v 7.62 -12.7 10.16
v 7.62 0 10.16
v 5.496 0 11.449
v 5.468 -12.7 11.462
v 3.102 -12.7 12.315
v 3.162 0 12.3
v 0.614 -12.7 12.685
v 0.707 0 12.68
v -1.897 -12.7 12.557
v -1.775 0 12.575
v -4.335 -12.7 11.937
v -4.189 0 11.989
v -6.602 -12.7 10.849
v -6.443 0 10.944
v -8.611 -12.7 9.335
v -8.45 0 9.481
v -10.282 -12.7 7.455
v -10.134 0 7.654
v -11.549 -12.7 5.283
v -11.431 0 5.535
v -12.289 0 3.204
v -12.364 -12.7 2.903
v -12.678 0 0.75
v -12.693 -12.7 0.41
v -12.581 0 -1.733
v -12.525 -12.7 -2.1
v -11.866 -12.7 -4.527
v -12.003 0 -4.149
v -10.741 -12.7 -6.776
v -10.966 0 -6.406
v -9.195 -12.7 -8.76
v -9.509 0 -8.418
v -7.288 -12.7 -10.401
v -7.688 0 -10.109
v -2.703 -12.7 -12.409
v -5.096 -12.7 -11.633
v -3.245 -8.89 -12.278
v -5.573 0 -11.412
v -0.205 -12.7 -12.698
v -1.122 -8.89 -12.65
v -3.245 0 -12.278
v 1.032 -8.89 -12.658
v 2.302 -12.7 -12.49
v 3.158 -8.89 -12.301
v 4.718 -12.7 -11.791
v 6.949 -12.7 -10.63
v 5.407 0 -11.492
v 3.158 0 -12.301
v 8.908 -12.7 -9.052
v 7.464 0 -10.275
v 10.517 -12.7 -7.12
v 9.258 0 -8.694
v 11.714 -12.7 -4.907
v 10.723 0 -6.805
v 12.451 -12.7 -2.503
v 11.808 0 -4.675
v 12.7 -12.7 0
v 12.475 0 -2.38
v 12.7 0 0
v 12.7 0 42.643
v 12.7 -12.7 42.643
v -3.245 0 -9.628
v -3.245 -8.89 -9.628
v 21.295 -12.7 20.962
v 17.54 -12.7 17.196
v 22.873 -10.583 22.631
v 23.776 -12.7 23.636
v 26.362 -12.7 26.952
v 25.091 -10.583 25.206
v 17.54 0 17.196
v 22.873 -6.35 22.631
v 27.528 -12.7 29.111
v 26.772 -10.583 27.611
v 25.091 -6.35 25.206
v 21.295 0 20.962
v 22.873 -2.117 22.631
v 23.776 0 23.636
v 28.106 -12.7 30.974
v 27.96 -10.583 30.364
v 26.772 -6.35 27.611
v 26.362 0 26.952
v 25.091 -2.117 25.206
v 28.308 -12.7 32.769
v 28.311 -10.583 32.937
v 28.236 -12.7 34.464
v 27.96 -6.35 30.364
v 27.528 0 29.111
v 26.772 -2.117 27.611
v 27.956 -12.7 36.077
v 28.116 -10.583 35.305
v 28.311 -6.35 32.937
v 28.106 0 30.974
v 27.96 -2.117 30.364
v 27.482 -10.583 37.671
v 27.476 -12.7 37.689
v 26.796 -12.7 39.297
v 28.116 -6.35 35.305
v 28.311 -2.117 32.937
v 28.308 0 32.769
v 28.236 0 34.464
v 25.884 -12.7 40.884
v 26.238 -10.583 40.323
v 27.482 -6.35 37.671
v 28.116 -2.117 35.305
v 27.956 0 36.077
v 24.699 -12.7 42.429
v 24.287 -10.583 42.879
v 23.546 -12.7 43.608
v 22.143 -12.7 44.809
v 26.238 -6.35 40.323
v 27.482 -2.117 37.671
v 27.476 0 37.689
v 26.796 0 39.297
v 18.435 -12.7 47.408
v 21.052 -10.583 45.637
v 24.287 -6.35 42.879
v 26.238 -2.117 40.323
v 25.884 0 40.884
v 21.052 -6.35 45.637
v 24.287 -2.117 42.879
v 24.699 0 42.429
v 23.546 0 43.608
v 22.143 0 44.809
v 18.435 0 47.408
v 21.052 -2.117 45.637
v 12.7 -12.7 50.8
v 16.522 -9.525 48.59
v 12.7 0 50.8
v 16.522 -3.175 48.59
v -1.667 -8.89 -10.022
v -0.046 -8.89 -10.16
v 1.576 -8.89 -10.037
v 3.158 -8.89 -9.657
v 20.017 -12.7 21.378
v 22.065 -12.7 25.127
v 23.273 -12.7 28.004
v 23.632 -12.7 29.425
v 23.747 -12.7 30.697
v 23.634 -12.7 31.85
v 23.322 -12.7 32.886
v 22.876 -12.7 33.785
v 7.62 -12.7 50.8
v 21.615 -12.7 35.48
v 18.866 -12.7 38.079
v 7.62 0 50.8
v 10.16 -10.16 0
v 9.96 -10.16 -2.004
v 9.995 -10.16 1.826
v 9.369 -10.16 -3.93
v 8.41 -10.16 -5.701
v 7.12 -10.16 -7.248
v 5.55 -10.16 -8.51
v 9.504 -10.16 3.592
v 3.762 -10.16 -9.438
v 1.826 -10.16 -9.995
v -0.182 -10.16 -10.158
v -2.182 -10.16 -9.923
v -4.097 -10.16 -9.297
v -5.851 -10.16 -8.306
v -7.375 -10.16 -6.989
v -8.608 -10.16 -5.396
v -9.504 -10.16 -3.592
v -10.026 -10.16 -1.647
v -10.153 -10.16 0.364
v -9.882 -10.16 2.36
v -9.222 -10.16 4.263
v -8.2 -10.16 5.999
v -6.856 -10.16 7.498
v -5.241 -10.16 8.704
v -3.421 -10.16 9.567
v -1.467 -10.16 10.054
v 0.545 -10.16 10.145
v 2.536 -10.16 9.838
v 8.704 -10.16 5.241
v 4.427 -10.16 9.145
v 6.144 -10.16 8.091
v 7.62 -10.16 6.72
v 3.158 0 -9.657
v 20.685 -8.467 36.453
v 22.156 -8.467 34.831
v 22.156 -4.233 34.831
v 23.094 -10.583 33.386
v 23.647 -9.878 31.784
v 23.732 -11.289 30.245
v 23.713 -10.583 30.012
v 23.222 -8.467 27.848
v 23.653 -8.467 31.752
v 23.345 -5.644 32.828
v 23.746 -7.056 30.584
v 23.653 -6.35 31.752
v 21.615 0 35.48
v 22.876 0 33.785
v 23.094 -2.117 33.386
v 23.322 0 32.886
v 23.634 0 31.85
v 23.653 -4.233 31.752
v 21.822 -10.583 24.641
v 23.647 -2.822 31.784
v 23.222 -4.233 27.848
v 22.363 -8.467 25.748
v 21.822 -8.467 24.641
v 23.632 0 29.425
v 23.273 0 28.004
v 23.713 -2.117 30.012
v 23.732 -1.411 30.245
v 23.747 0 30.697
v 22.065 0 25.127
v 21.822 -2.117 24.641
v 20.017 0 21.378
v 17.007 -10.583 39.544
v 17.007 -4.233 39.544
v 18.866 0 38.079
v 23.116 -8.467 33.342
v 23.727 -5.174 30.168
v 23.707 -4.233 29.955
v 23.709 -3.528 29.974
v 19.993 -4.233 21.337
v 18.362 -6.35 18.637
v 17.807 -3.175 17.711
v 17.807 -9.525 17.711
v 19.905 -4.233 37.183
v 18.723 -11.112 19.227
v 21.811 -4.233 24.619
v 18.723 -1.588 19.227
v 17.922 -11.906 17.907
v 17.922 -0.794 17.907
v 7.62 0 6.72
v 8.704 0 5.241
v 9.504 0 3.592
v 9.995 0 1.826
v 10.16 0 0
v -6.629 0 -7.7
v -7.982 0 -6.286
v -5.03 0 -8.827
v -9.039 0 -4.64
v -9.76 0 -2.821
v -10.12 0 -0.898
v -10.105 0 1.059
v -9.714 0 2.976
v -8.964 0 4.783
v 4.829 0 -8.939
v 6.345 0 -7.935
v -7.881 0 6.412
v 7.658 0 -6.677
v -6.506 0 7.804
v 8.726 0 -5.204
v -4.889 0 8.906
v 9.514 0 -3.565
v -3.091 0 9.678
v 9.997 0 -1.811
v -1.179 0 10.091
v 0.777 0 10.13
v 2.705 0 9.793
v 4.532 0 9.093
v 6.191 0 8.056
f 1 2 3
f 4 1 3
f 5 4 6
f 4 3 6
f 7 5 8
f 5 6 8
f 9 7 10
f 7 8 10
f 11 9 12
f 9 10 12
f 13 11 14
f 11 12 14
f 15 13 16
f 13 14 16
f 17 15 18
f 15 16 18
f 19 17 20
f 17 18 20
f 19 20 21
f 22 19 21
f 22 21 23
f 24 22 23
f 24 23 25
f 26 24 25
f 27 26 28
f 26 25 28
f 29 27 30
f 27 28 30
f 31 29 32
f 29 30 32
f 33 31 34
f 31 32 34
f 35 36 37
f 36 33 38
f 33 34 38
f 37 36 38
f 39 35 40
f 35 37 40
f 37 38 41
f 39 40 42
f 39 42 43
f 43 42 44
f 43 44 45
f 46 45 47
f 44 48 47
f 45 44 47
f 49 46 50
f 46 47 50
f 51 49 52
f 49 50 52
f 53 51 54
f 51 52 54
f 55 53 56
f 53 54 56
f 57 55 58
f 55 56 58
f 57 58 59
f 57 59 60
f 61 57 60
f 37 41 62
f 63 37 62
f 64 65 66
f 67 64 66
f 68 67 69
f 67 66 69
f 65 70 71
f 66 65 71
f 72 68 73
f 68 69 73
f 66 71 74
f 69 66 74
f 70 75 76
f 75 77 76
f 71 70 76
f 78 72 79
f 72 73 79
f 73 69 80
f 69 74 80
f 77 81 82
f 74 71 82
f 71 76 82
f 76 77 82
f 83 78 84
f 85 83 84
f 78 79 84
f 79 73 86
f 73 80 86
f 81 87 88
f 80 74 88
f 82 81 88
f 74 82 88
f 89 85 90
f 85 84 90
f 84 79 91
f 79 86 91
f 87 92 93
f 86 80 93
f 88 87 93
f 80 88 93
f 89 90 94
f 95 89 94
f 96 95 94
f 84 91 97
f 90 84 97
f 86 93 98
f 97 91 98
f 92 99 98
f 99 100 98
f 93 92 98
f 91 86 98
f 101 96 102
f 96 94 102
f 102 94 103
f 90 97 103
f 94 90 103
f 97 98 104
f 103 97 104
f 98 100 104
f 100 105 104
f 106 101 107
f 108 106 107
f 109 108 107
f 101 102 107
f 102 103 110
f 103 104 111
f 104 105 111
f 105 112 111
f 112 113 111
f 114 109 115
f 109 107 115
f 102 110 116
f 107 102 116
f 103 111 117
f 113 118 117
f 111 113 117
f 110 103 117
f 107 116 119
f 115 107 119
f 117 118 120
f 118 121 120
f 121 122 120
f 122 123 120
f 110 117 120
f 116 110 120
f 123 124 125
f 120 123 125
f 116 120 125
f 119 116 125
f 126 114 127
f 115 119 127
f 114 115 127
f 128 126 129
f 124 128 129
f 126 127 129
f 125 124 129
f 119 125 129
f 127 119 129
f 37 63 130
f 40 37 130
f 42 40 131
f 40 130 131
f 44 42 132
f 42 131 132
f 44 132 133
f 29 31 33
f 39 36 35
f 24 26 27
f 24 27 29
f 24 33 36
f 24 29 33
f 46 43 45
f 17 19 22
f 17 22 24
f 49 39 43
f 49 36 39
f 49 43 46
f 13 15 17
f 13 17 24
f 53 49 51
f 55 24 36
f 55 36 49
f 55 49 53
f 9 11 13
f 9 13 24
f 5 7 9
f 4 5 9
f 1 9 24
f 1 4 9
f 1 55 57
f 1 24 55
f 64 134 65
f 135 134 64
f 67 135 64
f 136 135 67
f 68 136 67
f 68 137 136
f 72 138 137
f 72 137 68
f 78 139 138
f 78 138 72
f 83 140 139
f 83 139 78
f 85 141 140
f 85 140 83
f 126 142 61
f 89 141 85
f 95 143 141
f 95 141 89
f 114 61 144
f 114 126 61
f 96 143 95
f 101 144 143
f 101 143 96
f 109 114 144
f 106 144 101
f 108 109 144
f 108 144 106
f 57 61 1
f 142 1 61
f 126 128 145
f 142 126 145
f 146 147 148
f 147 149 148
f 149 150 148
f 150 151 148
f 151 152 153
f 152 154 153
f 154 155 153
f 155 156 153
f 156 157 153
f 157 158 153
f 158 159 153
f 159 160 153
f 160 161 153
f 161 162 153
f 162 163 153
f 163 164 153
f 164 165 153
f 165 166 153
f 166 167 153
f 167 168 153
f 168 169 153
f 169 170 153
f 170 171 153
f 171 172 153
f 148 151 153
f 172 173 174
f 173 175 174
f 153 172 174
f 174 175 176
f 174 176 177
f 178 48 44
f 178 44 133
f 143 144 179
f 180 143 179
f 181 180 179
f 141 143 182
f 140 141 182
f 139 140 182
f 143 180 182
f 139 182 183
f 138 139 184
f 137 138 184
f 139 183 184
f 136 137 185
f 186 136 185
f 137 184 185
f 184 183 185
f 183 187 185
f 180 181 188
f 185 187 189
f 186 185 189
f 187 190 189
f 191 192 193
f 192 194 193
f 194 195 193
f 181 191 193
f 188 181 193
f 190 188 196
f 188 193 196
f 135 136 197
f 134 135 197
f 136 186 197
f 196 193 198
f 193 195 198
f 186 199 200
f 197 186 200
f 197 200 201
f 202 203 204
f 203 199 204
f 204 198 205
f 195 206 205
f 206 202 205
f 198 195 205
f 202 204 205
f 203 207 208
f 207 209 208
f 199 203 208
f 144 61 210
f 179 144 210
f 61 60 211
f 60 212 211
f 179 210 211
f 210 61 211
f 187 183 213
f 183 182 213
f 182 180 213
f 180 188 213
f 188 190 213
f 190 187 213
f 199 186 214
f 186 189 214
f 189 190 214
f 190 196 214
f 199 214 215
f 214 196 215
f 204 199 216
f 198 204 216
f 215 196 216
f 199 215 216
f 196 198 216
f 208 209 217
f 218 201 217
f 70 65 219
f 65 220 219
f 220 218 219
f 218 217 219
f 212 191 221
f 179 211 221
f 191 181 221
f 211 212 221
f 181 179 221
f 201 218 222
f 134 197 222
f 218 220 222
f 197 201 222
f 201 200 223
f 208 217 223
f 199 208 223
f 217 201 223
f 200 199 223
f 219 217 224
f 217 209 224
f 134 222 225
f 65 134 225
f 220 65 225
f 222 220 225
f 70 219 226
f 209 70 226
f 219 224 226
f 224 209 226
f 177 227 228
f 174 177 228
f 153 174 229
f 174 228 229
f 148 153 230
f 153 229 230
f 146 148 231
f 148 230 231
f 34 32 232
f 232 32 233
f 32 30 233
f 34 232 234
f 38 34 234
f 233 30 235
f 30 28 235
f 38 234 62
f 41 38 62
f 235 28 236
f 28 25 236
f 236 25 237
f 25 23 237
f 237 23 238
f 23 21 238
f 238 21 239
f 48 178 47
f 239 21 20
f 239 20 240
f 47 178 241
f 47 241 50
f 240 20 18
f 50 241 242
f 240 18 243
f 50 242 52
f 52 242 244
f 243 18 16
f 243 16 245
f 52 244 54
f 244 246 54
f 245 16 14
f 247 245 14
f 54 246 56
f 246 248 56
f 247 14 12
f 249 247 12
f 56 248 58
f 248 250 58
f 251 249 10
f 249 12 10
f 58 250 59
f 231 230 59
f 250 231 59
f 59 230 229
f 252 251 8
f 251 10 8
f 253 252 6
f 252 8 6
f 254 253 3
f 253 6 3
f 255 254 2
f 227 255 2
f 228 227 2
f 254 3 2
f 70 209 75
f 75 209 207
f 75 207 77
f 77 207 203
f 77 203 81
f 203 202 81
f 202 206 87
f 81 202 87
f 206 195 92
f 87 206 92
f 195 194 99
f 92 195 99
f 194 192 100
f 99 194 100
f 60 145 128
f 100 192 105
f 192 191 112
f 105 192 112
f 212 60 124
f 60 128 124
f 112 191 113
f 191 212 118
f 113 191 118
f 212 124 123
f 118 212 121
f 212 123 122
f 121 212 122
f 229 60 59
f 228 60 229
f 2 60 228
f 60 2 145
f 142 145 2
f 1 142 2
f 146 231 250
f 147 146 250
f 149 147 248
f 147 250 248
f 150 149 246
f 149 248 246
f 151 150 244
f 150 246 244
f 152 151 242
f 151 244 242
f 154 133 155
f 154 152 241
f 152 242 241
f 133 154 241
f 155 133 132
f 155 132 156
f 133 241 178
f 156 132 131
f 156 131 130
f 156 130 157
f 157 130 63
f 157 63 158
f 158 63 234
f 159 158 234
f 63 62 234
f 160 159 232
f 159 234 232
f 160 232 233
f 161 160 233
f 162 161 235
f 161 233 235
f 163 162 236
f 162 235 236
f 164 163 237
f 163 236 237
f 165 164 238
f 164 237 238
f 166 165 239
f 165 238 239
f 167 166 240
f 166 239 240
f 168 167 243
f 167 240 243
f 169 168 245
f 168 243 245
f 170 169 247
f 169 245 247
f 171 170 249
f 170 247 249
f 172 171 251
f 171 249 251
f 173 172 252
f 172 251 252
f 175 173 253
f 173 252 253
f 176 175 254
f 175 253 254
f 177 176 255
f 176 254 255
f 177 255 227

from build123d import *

# Parameters (mm, degrees)
F1_DEPTH = 10.16
F3_R     = 12.7
F4_DEPTH = 2.54
F5_DEPTH = 12.7
F6_W     = 6.4024168532
F6_H     = 4.7285845503
F7_DEPTH = 8.89


# Not quite as in the source:
# - a feature names something its author has since deleted; it is built from what else it names


with BuildPart() as f1:
    # F0 (on Front) → F1 (new body)
    with BuildSketch(Plane.XZ):
        with BuildLine():
            ThreePointArc((7.62, 10.16), (-11.3592253257, -5.6796126628), (12.7, 0))
            Line((12.7, 0), (10.16, 0))
            ThreePointArc((10.16, 0), (-9.5038097624, -3.5921024484), (7.62, 6.7202083301))
            Line((7.62, 6.7202083301), (7.62, 10.16))
        make_face()
        with BuildLine():
            Line((10.16, 0), (12.7, 0))
            ThreePointArc((12.7, 0), (11.3592253257, 5.6796126628), (7.62, 10.16))
            Line((7.62, 10.16), (7.62, 6.7202083301))
            ThreePointArc((7.62, 6.7202083301), (9.5038097624, 3.5921024484), (10.16, 0))
        make_face()
    extrude(amount=F1_DEPTH)

    # F3 (on offset) → F4 (join)
    with BuildSketch(Plane.XZ.offset(10.16)):
        Circle(F3_R)
    extrude(amount=F4_DEPTH)

    # F0 (on Front) → F5 (join)
    with BuildSketch(Plane.XZ):
        with BuildLine():
            ThreePointArc((7.62, 10.16), (11.3592253257, 5.6796126628), (12.7, 0))
            Line((12.7, 0), (12.7, 42.6425151527))
            Line((12.7, 42.6425151527), (12.7, 50.8))
            Line((12.7, 50.8), (7.62, 50.8))
            Line((7.62, 50.8), (7.62, 10.16))
        make_face()
        with BuildLine():
            Line((12.7, 50.8), (12.7, 42.6425151527))
            add(Edge.make_bspline(
                [(12.7, 42.6425151527), (16.4159388024, 40.0315705937), (22.9518647177, 35.4392075022), (24.9899073327, 28.3591527492), (17.7928973736, 17.9350558311), (17.5403915346, 17.1955488622)],
                knots=[0, 0, 0, 0, 0.3509731008, 0.6173229181, 0.9655230387, 0.9655230387, 0.9655230387, 0.9655230387], degree=3))
            add(Edge.make_bspline(
                [(17.5403915346, 17.1955488622), (21.2544211974, 20.8693964105), (27.3124893335, 26.8619222623), (28.6399816467, 32.8200369115), (27.7218714736, 37.874085965), (24.7037959914, 43.3162815788), (17.5887424866, 48.0374298627), (14.2146676642, 49.9440793479), (12.7, 50.8)],
                knots=[0, 0, 0, 0, 0.2328114889, 0.3797459877, 0.5165565754, 0.6708114391, 0.8522228182, 1, 1, 1, 1], degree=3))
        make_face()
    extrude(amount=F5_DEPTH)

    # F6 (on Front) → F7 (cut)
    with BuildSketch(Plane.XZ):
        with Locations((-0.0436579576, -11.8226897903)):
            Rectangle(F6_W, F6_H)
    extrude(amount=F7_DEPTH, mode=Mode.SUBTRACT)


solid = f1.part
